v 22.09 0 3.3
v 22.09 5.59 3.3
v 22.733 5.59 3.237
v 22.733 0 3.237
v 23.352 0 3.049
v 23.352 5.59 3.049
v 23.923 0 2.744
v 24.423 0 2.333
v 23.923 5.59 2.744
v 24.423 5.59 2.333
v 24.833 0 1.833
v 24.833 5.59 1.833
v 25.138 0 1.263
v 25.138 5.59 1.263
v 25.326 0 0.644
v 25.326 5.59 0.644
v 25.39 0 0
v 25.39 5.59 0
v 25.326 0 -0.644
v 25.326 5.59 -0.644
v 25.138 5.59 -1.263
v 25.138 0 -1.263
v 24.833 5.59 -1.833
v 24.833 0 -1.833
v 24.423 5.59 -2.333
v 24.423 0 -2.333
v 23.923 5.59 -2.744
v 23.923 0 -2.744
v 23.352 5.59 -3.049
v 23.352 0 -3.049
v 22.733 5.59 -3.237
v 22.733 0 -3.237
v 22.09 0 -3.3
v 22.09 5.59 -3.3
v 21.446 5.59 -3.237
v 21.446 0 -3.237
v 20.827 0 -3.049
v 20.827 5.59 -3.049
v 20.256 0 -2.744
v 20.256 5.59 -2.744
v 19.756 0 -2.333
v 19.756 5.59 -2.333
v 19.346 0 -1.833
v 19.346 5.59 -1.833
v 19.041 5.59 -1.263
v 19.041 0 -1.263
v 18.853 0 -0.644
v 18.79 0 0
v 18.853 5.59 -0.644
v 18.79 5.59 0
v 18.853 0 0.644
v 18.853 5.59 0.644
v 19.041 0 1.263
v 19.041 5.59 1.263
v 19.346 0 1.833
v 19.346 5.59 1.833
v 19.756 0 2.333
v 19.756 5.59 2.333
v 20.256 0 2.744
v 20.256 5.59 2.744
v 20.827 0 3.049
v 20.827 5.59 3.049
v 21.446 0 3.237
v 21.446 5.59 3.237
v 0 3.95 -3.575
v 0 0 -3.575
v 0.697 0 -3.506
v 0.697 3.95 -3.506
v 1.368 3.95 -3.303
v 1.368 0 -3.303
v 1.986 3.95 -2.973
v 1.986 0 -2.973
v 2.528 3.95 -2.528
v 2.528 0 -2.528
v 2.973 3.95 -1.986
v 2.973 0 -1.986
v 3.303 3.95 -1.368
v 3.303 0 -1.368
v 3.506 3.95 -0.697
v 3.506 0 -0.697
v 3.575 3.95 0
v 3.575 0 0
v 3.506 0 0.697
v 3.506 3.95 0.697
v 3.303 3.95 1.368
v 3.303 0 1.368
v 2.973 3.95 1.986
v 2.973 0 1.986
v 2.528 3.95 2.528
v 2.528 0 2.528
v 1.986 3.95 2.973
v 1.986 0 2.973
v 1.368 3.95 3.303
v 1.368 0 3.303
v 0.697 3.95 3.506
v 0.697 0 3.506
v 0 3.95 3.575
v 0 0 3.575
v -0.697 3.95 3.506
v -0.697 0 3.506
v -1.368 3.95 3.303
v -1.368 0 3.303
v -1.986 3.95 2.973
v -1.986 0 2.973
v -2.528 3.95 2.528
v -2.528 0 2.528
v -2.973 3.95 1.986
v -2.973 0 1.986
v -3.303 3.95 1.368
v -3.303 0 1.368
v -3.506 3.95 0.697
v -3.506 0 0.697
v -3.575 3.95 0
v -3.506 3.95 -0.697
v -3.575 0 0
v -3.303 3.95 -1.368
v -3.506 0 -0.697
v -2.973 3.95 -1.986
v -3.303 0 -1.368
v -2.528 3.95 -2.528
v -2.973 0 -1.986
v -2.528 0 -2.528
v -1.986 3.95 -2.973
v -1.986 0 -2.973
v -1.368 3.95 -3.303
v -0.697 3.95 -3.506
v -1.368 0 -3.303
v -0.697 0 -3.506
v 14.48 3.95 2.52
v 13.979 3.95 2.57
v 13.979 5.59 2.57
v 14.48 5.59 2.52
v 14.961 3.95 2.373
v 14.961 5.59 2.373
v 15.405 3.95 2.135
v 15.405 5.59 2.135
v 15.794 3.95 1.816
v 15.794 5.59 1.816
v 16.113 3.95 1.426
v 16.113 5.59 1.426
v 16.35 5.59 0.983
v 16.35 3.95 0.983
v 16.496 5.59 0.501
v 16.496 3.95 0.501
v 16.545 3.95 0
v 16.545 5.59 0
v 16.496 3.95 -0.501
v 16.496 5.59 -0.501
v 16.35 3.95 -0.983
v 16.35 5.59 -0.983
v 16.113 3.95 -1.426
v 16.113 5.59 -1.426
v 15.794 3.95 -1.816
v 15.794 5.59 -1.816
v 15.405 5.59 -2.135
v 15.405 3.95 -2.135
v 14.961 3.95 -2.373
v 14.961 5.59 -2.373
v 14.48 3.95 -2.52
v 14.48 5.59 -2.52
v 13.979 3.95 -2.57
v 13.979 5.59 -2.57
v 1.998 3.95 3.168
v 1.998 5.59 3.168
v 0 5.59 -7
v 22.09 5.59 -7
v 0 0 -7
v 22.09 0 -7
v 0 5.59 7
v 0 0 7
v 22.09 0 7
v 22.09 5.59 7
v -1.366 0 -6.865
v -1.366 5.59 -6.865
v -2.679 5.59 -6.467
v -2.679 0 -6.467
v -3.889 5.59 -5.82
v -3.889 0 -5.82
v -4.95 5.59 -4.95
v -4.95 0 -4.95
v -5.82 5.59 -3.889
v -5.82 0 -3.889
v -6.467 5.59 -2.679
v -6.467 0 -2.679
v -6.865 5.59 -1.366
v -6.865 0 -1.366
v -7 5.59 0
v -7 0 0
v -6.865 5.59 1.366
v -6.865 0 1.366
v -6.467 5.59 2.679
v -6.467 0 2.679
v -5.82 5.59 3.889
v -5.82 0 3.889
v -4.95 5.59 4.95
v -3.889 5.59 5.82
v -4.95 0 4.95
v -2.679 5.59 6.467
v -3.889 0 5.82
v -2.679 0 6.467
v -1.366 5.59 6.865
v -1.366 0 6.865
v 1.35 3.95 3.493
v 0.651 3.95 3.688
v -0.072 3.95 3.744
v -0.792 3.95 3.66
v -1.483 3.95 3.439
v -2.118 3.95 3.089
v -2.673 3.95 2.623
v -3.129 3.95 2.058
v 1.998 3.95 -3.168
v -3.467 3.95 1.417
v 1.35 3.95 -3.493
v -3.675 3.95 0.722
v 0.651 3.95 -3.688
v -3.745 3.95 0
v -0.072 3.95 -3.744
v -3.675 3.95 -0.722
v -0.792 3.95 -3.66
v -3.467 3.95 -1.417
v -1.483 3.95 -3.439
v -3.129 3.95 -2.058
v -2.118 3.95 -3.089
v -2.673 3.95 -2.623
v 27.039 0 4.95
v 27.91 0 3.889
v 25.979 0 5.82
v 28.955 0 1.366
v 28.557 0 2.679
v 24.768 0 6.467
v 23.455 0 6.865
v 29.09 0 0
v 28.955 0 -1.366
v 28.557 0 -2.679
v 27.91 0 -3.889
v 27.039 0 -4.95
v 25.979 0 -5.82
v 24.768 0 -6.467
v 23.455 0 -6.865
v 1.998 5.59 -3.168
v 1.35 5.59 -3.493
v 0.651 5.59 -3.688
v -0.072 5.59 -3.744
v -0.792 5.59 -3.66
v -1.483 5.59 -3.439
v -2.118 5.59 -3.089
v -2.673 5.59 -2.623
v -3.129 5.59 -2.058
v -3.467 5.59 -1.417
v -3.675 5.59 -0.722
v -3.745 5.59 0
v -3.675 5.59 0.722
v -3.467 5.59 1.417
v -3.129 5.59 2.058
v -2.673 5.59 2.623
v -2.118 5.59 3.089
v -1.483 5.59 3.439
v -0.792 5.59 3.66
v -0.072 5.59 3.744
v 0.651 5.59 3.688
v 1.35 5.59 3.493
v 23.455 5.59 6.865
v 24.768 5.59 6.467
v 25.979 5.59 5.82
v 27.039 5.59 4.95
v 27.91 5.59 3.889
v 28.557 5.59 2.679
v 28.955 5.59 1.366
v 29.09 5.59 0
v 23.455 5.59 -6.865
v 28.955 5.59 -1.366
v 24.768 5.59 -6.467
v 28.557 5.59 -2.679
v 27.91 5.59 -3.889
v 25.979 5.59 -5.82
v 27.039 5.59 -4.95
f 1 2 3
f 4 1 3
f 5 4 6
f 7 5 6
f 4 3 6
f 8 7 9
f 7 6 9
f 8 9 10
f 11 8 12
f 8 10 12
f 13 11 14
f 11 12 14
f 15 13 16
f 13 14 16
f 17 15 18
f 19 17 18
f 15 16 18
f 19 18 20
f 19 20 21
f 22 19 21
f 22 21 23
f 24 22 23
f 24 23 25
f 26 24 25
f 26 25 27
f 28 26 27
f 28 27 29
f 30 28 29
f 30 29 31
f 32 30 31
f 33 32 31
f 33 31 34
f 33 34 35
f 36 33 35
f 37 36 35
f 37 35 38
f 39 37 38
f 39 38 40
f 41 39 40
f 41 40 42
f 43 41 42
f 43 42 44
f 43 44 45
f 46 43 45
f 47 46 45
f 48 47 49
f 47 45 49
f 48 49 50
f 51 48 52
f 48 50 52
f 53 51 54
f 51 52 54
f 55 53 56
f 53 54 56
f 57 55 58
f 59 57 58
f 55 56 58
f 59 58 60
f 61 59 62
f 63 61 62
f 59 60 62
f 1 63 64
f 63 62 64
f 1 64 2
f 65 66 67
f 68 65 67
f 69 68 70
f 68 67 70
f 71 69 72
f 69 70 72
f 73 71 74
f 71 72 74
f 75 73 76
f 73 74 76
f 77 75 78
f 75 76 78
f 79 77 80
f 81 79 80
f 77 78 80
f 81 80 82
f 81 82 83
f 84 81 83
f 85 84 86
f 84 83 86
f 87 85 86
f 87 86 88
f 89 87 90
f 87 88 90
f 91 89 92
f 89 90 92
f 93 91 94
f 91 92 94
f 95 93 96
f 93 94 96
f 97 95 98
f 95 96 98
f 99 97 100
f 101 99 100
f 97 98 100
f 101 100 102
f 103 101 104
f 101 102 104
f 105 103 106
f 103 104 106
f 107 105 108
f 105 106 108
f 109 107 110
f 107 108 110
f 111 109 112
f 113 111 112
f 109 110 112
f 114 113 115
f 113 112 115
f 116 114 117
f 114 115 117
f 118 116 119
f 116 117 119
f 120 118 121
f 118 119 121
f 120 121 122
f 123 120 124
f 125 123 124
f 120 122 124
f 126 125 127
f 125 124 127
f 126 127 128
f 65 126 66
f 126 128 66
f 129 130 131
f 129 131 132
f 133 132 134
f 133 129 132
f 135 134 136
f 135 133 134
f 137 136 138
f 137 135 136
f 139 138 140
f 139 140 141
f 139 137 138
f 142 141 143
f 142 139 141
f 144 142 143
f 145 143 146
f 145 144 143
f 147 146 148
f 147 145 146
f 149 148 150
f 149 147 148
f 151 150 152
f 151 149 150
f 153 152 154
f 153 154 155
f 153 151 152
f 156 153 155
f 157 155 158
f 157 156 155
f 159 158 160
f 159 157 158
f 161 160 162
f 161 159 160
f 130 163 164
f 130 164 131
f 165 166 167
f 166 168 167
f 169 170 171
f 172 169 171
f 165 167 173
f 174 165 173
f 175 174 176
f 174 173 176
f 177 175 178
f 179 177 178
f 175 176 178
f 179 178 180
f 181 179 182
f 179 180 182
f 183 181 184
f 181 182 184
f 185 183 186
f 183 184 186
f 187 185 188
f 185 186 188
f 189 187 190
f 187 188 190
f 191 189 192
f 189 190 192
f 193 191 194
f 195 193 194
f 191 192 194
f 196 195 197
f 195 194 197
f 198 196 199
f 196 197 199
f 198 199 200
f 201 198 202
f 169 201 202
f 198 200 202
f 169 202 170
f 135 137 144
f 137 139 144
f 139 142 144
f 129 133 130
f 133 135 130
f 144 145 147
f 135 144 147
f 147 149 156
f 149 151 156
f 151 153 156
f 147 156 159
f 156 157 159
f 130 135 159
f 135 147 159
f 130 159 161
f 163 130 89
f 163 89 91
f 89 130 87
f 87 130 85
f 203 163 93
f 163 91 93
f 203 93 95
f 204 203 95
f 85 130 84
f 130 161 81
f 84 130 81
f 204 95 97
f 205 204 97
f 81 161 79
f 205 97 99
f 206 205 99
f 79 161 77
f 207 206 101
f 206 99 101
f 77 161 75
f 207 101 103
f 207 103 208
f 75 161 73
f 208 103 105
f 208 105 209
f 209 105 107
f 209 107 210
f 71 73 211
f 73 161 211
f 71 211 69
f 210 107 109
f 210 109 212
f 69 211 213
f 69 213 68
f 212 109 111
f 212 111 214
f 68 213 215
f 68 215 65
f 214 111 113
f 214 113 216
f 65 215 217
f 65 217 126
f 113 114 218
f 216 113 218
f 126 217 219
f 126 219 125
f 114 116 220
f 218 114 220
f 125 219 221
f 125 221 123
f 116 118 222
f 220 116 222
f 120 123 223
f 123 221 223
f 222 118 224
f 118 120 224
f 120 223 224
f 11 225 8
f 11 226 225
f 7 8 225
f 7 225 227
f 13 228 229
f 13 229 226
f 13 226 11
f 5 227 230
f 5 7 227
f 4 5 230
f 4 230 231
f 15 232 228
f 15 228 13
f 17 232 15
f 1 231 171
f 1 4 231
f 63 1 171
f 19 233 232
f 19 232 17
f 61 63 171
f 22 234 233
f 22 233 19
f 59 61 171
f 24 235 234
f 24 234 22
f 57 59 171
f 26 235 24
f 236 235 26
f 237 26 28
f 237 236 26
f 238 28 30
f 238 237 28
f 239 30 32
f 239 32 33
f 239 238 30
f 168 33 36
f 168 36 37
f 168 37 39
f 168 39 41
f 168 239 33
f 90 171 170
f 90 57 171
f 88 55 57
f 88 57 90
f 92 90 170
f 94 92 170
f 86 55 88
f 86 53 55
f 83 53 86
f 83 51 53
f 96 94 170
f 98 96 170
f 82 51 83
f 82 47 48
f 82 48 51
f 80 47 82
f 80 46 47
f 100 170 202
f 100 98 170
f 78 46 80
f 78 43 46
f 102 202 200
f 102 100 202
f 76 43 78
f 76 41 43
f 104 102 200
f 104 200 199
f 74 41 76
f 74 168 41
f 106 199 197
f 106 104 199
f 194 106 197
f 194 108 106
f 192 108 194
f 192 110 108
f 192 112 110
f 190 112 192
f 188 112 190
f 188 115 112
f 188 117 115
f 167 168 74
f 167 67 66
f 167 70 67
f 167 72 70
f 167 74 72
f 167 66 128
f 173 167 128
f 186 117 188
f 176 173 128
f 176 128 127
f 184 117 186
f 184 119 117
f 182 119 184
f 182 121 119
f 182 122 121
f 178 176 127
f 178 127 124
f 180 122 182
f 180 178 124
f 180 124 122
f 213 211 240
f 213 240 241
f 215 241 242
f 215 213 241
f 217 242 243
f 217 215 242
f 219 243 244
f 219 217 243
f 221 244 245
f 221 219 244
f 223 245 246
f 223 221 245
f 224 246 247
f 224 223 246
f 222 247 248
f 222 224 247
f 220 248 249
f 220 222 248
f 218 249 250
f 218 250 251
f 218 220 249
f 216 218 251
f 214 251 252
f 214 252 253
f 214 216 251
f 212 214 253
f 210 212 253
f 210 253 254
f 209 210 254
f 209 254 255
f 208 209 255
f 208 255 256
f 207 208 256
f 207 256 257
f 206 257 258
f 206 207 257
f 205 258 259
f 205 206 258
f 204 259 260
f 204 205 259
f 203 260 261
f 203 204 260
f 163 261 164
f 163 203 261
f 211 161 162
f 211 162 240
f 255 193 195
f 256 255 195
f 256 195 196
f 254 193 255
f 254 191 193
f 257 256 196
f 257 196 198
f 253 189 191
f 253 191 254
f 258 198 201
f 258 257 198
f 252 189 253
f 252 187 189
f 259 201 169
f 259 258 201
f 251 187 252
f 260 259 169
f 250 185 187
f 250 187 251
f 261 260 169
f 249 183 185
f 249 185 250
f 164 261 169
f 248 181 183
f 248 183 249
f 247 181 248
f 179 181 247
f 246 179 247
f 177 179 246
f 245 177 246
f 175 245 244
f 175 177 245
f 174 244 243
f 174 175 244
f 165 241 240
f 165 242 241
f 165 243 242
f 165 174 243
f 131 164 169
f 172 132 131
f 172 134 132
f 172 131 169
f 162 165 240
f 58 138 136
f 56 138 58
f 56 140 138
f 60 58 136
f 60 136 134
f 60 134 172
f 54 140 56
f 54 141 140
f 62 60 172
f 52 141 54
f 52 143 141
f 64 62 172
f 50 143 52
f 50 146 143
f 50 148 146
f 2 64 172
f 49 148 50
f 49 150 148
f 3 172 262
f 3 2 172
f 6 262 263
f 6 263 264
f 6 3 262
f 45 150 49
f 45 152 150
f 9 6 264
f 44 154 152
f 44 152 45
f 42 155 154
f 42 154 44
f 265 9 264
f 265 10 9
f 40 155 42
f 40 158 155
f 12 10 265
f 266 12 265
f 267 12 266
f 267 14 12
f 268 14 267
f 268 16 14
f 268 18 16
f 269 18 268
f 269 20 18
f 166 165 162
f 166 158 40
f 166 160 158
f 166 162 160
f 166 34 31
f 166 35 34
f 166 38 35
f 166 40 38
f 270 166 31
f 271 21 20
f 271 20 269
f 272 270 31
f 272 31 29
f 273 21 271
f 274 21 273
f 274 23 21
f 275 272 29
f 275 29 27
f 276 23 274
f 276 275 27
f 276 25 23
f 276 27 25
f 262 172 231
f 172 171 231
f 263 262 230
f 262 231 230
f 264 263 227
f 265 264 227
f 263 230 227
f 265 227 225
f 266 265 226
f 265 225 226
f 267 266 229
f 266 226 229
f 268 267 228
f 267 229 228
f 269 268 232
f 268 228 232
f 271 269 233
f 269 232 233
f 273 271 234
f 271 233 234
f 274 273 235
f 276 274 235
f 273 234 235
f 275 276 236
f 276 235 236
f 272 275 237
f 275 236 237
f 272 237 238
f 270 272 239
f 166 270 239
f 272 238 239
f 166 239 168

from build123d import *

# Parameters (mm, degrees)
BOSS_EXTRUDE1_DEPTH = 3.95
SKETCH2_R           = 3.575
CUT_EXTRUDE1_DEPTH  = 3.95
BOSS_EXTRUDE2_DEPTH = 1.64
SKETCH4_R           = 3.3
CUT_EXTRUDE2_DEPTH  = 31.43771091


with BuildPart() as part:
    # Sketch1 → Boss-Extrude1 (new body)
    with BuildSketch(Plane(origin=(0, 0, 0), x_dir=(1, 0, 0), z_dir=(0, 1, 0))):
        with BuildLine():
            Line((0, 7), (22.089622642, 7))
            ThreePointArc((22.089622642, 7), (29.089622642, 0), (22.089622642, -7))
            Line((22.089622642, -7), (0, -7))
            ThreePointArc((0, -7), (-7, 0), (0, 7))
        make_face()
    extrude(amount=BOSS_EXTRUDE1_DEPTH)

    # Sketch2 → Cut-Extrude1 (cut)
    with BuildSketch(Plane.XZ):
        with Locations(Location((0, 0, 0), (0, 0, 270))):
            Circle(SKETCH2_R)
    extrude(amount=-CUT_EXTRUDE1_DEPTH, mode=Mode.SUBTRACT)

    # Sketch3 → Boss-Extrude2 (add)
    with BuildSketch(Plane(origin=(0, 3.95, 0), x_dir=(1, 0, 0), z_dir=(0, 1, 0))):
        with BuildLine():
            Line((0, -7), (22.089622642, -7))
            ThreePointArc((22.089622642, -7), (29.089622642, 0), (22.089622642, 7))
            Line((22.089622642, 7), (0, 7))
            ThreePointArc((0, 7), (-7, 0), (0, -7))
        make_face()
        with BuildLine():
            Line((13.979308982, 2.569996388), (1.997926282, 3.167540934))
            ThreePointArc((1.997926282, 3.167540934), (-3.745, 0), (1.997926282, -3.167540934))
            Line((1.997926282, -3.167540934), (13.979308982, -2.569996388))
            ThreePointArc((13.979308982, -2.569996388), (16.545, 0), (13.979308982, 2.569996388))
        make_face(mode=Mode.SUBTRACT)
    extrude(amount=BOSS_EXTRUDE2_DEPTH)

    # Sketch4 → Cut-Extrude2 (cut, through all)
    with BuildSketch(Plane(origin=(0, 5.59, 0), x_dir=(1, 0, 0), z_dir=(0, 1, 0))):
        with Locations(Location((22.089622642, 0, 0), (0, 0, 270))):
            Circle(SKETCH4_R)
    extrude(amount=-CUT_EXTRUDE2_DEPTH, mode=Mode.SUBTRACT)


solid = part.part
